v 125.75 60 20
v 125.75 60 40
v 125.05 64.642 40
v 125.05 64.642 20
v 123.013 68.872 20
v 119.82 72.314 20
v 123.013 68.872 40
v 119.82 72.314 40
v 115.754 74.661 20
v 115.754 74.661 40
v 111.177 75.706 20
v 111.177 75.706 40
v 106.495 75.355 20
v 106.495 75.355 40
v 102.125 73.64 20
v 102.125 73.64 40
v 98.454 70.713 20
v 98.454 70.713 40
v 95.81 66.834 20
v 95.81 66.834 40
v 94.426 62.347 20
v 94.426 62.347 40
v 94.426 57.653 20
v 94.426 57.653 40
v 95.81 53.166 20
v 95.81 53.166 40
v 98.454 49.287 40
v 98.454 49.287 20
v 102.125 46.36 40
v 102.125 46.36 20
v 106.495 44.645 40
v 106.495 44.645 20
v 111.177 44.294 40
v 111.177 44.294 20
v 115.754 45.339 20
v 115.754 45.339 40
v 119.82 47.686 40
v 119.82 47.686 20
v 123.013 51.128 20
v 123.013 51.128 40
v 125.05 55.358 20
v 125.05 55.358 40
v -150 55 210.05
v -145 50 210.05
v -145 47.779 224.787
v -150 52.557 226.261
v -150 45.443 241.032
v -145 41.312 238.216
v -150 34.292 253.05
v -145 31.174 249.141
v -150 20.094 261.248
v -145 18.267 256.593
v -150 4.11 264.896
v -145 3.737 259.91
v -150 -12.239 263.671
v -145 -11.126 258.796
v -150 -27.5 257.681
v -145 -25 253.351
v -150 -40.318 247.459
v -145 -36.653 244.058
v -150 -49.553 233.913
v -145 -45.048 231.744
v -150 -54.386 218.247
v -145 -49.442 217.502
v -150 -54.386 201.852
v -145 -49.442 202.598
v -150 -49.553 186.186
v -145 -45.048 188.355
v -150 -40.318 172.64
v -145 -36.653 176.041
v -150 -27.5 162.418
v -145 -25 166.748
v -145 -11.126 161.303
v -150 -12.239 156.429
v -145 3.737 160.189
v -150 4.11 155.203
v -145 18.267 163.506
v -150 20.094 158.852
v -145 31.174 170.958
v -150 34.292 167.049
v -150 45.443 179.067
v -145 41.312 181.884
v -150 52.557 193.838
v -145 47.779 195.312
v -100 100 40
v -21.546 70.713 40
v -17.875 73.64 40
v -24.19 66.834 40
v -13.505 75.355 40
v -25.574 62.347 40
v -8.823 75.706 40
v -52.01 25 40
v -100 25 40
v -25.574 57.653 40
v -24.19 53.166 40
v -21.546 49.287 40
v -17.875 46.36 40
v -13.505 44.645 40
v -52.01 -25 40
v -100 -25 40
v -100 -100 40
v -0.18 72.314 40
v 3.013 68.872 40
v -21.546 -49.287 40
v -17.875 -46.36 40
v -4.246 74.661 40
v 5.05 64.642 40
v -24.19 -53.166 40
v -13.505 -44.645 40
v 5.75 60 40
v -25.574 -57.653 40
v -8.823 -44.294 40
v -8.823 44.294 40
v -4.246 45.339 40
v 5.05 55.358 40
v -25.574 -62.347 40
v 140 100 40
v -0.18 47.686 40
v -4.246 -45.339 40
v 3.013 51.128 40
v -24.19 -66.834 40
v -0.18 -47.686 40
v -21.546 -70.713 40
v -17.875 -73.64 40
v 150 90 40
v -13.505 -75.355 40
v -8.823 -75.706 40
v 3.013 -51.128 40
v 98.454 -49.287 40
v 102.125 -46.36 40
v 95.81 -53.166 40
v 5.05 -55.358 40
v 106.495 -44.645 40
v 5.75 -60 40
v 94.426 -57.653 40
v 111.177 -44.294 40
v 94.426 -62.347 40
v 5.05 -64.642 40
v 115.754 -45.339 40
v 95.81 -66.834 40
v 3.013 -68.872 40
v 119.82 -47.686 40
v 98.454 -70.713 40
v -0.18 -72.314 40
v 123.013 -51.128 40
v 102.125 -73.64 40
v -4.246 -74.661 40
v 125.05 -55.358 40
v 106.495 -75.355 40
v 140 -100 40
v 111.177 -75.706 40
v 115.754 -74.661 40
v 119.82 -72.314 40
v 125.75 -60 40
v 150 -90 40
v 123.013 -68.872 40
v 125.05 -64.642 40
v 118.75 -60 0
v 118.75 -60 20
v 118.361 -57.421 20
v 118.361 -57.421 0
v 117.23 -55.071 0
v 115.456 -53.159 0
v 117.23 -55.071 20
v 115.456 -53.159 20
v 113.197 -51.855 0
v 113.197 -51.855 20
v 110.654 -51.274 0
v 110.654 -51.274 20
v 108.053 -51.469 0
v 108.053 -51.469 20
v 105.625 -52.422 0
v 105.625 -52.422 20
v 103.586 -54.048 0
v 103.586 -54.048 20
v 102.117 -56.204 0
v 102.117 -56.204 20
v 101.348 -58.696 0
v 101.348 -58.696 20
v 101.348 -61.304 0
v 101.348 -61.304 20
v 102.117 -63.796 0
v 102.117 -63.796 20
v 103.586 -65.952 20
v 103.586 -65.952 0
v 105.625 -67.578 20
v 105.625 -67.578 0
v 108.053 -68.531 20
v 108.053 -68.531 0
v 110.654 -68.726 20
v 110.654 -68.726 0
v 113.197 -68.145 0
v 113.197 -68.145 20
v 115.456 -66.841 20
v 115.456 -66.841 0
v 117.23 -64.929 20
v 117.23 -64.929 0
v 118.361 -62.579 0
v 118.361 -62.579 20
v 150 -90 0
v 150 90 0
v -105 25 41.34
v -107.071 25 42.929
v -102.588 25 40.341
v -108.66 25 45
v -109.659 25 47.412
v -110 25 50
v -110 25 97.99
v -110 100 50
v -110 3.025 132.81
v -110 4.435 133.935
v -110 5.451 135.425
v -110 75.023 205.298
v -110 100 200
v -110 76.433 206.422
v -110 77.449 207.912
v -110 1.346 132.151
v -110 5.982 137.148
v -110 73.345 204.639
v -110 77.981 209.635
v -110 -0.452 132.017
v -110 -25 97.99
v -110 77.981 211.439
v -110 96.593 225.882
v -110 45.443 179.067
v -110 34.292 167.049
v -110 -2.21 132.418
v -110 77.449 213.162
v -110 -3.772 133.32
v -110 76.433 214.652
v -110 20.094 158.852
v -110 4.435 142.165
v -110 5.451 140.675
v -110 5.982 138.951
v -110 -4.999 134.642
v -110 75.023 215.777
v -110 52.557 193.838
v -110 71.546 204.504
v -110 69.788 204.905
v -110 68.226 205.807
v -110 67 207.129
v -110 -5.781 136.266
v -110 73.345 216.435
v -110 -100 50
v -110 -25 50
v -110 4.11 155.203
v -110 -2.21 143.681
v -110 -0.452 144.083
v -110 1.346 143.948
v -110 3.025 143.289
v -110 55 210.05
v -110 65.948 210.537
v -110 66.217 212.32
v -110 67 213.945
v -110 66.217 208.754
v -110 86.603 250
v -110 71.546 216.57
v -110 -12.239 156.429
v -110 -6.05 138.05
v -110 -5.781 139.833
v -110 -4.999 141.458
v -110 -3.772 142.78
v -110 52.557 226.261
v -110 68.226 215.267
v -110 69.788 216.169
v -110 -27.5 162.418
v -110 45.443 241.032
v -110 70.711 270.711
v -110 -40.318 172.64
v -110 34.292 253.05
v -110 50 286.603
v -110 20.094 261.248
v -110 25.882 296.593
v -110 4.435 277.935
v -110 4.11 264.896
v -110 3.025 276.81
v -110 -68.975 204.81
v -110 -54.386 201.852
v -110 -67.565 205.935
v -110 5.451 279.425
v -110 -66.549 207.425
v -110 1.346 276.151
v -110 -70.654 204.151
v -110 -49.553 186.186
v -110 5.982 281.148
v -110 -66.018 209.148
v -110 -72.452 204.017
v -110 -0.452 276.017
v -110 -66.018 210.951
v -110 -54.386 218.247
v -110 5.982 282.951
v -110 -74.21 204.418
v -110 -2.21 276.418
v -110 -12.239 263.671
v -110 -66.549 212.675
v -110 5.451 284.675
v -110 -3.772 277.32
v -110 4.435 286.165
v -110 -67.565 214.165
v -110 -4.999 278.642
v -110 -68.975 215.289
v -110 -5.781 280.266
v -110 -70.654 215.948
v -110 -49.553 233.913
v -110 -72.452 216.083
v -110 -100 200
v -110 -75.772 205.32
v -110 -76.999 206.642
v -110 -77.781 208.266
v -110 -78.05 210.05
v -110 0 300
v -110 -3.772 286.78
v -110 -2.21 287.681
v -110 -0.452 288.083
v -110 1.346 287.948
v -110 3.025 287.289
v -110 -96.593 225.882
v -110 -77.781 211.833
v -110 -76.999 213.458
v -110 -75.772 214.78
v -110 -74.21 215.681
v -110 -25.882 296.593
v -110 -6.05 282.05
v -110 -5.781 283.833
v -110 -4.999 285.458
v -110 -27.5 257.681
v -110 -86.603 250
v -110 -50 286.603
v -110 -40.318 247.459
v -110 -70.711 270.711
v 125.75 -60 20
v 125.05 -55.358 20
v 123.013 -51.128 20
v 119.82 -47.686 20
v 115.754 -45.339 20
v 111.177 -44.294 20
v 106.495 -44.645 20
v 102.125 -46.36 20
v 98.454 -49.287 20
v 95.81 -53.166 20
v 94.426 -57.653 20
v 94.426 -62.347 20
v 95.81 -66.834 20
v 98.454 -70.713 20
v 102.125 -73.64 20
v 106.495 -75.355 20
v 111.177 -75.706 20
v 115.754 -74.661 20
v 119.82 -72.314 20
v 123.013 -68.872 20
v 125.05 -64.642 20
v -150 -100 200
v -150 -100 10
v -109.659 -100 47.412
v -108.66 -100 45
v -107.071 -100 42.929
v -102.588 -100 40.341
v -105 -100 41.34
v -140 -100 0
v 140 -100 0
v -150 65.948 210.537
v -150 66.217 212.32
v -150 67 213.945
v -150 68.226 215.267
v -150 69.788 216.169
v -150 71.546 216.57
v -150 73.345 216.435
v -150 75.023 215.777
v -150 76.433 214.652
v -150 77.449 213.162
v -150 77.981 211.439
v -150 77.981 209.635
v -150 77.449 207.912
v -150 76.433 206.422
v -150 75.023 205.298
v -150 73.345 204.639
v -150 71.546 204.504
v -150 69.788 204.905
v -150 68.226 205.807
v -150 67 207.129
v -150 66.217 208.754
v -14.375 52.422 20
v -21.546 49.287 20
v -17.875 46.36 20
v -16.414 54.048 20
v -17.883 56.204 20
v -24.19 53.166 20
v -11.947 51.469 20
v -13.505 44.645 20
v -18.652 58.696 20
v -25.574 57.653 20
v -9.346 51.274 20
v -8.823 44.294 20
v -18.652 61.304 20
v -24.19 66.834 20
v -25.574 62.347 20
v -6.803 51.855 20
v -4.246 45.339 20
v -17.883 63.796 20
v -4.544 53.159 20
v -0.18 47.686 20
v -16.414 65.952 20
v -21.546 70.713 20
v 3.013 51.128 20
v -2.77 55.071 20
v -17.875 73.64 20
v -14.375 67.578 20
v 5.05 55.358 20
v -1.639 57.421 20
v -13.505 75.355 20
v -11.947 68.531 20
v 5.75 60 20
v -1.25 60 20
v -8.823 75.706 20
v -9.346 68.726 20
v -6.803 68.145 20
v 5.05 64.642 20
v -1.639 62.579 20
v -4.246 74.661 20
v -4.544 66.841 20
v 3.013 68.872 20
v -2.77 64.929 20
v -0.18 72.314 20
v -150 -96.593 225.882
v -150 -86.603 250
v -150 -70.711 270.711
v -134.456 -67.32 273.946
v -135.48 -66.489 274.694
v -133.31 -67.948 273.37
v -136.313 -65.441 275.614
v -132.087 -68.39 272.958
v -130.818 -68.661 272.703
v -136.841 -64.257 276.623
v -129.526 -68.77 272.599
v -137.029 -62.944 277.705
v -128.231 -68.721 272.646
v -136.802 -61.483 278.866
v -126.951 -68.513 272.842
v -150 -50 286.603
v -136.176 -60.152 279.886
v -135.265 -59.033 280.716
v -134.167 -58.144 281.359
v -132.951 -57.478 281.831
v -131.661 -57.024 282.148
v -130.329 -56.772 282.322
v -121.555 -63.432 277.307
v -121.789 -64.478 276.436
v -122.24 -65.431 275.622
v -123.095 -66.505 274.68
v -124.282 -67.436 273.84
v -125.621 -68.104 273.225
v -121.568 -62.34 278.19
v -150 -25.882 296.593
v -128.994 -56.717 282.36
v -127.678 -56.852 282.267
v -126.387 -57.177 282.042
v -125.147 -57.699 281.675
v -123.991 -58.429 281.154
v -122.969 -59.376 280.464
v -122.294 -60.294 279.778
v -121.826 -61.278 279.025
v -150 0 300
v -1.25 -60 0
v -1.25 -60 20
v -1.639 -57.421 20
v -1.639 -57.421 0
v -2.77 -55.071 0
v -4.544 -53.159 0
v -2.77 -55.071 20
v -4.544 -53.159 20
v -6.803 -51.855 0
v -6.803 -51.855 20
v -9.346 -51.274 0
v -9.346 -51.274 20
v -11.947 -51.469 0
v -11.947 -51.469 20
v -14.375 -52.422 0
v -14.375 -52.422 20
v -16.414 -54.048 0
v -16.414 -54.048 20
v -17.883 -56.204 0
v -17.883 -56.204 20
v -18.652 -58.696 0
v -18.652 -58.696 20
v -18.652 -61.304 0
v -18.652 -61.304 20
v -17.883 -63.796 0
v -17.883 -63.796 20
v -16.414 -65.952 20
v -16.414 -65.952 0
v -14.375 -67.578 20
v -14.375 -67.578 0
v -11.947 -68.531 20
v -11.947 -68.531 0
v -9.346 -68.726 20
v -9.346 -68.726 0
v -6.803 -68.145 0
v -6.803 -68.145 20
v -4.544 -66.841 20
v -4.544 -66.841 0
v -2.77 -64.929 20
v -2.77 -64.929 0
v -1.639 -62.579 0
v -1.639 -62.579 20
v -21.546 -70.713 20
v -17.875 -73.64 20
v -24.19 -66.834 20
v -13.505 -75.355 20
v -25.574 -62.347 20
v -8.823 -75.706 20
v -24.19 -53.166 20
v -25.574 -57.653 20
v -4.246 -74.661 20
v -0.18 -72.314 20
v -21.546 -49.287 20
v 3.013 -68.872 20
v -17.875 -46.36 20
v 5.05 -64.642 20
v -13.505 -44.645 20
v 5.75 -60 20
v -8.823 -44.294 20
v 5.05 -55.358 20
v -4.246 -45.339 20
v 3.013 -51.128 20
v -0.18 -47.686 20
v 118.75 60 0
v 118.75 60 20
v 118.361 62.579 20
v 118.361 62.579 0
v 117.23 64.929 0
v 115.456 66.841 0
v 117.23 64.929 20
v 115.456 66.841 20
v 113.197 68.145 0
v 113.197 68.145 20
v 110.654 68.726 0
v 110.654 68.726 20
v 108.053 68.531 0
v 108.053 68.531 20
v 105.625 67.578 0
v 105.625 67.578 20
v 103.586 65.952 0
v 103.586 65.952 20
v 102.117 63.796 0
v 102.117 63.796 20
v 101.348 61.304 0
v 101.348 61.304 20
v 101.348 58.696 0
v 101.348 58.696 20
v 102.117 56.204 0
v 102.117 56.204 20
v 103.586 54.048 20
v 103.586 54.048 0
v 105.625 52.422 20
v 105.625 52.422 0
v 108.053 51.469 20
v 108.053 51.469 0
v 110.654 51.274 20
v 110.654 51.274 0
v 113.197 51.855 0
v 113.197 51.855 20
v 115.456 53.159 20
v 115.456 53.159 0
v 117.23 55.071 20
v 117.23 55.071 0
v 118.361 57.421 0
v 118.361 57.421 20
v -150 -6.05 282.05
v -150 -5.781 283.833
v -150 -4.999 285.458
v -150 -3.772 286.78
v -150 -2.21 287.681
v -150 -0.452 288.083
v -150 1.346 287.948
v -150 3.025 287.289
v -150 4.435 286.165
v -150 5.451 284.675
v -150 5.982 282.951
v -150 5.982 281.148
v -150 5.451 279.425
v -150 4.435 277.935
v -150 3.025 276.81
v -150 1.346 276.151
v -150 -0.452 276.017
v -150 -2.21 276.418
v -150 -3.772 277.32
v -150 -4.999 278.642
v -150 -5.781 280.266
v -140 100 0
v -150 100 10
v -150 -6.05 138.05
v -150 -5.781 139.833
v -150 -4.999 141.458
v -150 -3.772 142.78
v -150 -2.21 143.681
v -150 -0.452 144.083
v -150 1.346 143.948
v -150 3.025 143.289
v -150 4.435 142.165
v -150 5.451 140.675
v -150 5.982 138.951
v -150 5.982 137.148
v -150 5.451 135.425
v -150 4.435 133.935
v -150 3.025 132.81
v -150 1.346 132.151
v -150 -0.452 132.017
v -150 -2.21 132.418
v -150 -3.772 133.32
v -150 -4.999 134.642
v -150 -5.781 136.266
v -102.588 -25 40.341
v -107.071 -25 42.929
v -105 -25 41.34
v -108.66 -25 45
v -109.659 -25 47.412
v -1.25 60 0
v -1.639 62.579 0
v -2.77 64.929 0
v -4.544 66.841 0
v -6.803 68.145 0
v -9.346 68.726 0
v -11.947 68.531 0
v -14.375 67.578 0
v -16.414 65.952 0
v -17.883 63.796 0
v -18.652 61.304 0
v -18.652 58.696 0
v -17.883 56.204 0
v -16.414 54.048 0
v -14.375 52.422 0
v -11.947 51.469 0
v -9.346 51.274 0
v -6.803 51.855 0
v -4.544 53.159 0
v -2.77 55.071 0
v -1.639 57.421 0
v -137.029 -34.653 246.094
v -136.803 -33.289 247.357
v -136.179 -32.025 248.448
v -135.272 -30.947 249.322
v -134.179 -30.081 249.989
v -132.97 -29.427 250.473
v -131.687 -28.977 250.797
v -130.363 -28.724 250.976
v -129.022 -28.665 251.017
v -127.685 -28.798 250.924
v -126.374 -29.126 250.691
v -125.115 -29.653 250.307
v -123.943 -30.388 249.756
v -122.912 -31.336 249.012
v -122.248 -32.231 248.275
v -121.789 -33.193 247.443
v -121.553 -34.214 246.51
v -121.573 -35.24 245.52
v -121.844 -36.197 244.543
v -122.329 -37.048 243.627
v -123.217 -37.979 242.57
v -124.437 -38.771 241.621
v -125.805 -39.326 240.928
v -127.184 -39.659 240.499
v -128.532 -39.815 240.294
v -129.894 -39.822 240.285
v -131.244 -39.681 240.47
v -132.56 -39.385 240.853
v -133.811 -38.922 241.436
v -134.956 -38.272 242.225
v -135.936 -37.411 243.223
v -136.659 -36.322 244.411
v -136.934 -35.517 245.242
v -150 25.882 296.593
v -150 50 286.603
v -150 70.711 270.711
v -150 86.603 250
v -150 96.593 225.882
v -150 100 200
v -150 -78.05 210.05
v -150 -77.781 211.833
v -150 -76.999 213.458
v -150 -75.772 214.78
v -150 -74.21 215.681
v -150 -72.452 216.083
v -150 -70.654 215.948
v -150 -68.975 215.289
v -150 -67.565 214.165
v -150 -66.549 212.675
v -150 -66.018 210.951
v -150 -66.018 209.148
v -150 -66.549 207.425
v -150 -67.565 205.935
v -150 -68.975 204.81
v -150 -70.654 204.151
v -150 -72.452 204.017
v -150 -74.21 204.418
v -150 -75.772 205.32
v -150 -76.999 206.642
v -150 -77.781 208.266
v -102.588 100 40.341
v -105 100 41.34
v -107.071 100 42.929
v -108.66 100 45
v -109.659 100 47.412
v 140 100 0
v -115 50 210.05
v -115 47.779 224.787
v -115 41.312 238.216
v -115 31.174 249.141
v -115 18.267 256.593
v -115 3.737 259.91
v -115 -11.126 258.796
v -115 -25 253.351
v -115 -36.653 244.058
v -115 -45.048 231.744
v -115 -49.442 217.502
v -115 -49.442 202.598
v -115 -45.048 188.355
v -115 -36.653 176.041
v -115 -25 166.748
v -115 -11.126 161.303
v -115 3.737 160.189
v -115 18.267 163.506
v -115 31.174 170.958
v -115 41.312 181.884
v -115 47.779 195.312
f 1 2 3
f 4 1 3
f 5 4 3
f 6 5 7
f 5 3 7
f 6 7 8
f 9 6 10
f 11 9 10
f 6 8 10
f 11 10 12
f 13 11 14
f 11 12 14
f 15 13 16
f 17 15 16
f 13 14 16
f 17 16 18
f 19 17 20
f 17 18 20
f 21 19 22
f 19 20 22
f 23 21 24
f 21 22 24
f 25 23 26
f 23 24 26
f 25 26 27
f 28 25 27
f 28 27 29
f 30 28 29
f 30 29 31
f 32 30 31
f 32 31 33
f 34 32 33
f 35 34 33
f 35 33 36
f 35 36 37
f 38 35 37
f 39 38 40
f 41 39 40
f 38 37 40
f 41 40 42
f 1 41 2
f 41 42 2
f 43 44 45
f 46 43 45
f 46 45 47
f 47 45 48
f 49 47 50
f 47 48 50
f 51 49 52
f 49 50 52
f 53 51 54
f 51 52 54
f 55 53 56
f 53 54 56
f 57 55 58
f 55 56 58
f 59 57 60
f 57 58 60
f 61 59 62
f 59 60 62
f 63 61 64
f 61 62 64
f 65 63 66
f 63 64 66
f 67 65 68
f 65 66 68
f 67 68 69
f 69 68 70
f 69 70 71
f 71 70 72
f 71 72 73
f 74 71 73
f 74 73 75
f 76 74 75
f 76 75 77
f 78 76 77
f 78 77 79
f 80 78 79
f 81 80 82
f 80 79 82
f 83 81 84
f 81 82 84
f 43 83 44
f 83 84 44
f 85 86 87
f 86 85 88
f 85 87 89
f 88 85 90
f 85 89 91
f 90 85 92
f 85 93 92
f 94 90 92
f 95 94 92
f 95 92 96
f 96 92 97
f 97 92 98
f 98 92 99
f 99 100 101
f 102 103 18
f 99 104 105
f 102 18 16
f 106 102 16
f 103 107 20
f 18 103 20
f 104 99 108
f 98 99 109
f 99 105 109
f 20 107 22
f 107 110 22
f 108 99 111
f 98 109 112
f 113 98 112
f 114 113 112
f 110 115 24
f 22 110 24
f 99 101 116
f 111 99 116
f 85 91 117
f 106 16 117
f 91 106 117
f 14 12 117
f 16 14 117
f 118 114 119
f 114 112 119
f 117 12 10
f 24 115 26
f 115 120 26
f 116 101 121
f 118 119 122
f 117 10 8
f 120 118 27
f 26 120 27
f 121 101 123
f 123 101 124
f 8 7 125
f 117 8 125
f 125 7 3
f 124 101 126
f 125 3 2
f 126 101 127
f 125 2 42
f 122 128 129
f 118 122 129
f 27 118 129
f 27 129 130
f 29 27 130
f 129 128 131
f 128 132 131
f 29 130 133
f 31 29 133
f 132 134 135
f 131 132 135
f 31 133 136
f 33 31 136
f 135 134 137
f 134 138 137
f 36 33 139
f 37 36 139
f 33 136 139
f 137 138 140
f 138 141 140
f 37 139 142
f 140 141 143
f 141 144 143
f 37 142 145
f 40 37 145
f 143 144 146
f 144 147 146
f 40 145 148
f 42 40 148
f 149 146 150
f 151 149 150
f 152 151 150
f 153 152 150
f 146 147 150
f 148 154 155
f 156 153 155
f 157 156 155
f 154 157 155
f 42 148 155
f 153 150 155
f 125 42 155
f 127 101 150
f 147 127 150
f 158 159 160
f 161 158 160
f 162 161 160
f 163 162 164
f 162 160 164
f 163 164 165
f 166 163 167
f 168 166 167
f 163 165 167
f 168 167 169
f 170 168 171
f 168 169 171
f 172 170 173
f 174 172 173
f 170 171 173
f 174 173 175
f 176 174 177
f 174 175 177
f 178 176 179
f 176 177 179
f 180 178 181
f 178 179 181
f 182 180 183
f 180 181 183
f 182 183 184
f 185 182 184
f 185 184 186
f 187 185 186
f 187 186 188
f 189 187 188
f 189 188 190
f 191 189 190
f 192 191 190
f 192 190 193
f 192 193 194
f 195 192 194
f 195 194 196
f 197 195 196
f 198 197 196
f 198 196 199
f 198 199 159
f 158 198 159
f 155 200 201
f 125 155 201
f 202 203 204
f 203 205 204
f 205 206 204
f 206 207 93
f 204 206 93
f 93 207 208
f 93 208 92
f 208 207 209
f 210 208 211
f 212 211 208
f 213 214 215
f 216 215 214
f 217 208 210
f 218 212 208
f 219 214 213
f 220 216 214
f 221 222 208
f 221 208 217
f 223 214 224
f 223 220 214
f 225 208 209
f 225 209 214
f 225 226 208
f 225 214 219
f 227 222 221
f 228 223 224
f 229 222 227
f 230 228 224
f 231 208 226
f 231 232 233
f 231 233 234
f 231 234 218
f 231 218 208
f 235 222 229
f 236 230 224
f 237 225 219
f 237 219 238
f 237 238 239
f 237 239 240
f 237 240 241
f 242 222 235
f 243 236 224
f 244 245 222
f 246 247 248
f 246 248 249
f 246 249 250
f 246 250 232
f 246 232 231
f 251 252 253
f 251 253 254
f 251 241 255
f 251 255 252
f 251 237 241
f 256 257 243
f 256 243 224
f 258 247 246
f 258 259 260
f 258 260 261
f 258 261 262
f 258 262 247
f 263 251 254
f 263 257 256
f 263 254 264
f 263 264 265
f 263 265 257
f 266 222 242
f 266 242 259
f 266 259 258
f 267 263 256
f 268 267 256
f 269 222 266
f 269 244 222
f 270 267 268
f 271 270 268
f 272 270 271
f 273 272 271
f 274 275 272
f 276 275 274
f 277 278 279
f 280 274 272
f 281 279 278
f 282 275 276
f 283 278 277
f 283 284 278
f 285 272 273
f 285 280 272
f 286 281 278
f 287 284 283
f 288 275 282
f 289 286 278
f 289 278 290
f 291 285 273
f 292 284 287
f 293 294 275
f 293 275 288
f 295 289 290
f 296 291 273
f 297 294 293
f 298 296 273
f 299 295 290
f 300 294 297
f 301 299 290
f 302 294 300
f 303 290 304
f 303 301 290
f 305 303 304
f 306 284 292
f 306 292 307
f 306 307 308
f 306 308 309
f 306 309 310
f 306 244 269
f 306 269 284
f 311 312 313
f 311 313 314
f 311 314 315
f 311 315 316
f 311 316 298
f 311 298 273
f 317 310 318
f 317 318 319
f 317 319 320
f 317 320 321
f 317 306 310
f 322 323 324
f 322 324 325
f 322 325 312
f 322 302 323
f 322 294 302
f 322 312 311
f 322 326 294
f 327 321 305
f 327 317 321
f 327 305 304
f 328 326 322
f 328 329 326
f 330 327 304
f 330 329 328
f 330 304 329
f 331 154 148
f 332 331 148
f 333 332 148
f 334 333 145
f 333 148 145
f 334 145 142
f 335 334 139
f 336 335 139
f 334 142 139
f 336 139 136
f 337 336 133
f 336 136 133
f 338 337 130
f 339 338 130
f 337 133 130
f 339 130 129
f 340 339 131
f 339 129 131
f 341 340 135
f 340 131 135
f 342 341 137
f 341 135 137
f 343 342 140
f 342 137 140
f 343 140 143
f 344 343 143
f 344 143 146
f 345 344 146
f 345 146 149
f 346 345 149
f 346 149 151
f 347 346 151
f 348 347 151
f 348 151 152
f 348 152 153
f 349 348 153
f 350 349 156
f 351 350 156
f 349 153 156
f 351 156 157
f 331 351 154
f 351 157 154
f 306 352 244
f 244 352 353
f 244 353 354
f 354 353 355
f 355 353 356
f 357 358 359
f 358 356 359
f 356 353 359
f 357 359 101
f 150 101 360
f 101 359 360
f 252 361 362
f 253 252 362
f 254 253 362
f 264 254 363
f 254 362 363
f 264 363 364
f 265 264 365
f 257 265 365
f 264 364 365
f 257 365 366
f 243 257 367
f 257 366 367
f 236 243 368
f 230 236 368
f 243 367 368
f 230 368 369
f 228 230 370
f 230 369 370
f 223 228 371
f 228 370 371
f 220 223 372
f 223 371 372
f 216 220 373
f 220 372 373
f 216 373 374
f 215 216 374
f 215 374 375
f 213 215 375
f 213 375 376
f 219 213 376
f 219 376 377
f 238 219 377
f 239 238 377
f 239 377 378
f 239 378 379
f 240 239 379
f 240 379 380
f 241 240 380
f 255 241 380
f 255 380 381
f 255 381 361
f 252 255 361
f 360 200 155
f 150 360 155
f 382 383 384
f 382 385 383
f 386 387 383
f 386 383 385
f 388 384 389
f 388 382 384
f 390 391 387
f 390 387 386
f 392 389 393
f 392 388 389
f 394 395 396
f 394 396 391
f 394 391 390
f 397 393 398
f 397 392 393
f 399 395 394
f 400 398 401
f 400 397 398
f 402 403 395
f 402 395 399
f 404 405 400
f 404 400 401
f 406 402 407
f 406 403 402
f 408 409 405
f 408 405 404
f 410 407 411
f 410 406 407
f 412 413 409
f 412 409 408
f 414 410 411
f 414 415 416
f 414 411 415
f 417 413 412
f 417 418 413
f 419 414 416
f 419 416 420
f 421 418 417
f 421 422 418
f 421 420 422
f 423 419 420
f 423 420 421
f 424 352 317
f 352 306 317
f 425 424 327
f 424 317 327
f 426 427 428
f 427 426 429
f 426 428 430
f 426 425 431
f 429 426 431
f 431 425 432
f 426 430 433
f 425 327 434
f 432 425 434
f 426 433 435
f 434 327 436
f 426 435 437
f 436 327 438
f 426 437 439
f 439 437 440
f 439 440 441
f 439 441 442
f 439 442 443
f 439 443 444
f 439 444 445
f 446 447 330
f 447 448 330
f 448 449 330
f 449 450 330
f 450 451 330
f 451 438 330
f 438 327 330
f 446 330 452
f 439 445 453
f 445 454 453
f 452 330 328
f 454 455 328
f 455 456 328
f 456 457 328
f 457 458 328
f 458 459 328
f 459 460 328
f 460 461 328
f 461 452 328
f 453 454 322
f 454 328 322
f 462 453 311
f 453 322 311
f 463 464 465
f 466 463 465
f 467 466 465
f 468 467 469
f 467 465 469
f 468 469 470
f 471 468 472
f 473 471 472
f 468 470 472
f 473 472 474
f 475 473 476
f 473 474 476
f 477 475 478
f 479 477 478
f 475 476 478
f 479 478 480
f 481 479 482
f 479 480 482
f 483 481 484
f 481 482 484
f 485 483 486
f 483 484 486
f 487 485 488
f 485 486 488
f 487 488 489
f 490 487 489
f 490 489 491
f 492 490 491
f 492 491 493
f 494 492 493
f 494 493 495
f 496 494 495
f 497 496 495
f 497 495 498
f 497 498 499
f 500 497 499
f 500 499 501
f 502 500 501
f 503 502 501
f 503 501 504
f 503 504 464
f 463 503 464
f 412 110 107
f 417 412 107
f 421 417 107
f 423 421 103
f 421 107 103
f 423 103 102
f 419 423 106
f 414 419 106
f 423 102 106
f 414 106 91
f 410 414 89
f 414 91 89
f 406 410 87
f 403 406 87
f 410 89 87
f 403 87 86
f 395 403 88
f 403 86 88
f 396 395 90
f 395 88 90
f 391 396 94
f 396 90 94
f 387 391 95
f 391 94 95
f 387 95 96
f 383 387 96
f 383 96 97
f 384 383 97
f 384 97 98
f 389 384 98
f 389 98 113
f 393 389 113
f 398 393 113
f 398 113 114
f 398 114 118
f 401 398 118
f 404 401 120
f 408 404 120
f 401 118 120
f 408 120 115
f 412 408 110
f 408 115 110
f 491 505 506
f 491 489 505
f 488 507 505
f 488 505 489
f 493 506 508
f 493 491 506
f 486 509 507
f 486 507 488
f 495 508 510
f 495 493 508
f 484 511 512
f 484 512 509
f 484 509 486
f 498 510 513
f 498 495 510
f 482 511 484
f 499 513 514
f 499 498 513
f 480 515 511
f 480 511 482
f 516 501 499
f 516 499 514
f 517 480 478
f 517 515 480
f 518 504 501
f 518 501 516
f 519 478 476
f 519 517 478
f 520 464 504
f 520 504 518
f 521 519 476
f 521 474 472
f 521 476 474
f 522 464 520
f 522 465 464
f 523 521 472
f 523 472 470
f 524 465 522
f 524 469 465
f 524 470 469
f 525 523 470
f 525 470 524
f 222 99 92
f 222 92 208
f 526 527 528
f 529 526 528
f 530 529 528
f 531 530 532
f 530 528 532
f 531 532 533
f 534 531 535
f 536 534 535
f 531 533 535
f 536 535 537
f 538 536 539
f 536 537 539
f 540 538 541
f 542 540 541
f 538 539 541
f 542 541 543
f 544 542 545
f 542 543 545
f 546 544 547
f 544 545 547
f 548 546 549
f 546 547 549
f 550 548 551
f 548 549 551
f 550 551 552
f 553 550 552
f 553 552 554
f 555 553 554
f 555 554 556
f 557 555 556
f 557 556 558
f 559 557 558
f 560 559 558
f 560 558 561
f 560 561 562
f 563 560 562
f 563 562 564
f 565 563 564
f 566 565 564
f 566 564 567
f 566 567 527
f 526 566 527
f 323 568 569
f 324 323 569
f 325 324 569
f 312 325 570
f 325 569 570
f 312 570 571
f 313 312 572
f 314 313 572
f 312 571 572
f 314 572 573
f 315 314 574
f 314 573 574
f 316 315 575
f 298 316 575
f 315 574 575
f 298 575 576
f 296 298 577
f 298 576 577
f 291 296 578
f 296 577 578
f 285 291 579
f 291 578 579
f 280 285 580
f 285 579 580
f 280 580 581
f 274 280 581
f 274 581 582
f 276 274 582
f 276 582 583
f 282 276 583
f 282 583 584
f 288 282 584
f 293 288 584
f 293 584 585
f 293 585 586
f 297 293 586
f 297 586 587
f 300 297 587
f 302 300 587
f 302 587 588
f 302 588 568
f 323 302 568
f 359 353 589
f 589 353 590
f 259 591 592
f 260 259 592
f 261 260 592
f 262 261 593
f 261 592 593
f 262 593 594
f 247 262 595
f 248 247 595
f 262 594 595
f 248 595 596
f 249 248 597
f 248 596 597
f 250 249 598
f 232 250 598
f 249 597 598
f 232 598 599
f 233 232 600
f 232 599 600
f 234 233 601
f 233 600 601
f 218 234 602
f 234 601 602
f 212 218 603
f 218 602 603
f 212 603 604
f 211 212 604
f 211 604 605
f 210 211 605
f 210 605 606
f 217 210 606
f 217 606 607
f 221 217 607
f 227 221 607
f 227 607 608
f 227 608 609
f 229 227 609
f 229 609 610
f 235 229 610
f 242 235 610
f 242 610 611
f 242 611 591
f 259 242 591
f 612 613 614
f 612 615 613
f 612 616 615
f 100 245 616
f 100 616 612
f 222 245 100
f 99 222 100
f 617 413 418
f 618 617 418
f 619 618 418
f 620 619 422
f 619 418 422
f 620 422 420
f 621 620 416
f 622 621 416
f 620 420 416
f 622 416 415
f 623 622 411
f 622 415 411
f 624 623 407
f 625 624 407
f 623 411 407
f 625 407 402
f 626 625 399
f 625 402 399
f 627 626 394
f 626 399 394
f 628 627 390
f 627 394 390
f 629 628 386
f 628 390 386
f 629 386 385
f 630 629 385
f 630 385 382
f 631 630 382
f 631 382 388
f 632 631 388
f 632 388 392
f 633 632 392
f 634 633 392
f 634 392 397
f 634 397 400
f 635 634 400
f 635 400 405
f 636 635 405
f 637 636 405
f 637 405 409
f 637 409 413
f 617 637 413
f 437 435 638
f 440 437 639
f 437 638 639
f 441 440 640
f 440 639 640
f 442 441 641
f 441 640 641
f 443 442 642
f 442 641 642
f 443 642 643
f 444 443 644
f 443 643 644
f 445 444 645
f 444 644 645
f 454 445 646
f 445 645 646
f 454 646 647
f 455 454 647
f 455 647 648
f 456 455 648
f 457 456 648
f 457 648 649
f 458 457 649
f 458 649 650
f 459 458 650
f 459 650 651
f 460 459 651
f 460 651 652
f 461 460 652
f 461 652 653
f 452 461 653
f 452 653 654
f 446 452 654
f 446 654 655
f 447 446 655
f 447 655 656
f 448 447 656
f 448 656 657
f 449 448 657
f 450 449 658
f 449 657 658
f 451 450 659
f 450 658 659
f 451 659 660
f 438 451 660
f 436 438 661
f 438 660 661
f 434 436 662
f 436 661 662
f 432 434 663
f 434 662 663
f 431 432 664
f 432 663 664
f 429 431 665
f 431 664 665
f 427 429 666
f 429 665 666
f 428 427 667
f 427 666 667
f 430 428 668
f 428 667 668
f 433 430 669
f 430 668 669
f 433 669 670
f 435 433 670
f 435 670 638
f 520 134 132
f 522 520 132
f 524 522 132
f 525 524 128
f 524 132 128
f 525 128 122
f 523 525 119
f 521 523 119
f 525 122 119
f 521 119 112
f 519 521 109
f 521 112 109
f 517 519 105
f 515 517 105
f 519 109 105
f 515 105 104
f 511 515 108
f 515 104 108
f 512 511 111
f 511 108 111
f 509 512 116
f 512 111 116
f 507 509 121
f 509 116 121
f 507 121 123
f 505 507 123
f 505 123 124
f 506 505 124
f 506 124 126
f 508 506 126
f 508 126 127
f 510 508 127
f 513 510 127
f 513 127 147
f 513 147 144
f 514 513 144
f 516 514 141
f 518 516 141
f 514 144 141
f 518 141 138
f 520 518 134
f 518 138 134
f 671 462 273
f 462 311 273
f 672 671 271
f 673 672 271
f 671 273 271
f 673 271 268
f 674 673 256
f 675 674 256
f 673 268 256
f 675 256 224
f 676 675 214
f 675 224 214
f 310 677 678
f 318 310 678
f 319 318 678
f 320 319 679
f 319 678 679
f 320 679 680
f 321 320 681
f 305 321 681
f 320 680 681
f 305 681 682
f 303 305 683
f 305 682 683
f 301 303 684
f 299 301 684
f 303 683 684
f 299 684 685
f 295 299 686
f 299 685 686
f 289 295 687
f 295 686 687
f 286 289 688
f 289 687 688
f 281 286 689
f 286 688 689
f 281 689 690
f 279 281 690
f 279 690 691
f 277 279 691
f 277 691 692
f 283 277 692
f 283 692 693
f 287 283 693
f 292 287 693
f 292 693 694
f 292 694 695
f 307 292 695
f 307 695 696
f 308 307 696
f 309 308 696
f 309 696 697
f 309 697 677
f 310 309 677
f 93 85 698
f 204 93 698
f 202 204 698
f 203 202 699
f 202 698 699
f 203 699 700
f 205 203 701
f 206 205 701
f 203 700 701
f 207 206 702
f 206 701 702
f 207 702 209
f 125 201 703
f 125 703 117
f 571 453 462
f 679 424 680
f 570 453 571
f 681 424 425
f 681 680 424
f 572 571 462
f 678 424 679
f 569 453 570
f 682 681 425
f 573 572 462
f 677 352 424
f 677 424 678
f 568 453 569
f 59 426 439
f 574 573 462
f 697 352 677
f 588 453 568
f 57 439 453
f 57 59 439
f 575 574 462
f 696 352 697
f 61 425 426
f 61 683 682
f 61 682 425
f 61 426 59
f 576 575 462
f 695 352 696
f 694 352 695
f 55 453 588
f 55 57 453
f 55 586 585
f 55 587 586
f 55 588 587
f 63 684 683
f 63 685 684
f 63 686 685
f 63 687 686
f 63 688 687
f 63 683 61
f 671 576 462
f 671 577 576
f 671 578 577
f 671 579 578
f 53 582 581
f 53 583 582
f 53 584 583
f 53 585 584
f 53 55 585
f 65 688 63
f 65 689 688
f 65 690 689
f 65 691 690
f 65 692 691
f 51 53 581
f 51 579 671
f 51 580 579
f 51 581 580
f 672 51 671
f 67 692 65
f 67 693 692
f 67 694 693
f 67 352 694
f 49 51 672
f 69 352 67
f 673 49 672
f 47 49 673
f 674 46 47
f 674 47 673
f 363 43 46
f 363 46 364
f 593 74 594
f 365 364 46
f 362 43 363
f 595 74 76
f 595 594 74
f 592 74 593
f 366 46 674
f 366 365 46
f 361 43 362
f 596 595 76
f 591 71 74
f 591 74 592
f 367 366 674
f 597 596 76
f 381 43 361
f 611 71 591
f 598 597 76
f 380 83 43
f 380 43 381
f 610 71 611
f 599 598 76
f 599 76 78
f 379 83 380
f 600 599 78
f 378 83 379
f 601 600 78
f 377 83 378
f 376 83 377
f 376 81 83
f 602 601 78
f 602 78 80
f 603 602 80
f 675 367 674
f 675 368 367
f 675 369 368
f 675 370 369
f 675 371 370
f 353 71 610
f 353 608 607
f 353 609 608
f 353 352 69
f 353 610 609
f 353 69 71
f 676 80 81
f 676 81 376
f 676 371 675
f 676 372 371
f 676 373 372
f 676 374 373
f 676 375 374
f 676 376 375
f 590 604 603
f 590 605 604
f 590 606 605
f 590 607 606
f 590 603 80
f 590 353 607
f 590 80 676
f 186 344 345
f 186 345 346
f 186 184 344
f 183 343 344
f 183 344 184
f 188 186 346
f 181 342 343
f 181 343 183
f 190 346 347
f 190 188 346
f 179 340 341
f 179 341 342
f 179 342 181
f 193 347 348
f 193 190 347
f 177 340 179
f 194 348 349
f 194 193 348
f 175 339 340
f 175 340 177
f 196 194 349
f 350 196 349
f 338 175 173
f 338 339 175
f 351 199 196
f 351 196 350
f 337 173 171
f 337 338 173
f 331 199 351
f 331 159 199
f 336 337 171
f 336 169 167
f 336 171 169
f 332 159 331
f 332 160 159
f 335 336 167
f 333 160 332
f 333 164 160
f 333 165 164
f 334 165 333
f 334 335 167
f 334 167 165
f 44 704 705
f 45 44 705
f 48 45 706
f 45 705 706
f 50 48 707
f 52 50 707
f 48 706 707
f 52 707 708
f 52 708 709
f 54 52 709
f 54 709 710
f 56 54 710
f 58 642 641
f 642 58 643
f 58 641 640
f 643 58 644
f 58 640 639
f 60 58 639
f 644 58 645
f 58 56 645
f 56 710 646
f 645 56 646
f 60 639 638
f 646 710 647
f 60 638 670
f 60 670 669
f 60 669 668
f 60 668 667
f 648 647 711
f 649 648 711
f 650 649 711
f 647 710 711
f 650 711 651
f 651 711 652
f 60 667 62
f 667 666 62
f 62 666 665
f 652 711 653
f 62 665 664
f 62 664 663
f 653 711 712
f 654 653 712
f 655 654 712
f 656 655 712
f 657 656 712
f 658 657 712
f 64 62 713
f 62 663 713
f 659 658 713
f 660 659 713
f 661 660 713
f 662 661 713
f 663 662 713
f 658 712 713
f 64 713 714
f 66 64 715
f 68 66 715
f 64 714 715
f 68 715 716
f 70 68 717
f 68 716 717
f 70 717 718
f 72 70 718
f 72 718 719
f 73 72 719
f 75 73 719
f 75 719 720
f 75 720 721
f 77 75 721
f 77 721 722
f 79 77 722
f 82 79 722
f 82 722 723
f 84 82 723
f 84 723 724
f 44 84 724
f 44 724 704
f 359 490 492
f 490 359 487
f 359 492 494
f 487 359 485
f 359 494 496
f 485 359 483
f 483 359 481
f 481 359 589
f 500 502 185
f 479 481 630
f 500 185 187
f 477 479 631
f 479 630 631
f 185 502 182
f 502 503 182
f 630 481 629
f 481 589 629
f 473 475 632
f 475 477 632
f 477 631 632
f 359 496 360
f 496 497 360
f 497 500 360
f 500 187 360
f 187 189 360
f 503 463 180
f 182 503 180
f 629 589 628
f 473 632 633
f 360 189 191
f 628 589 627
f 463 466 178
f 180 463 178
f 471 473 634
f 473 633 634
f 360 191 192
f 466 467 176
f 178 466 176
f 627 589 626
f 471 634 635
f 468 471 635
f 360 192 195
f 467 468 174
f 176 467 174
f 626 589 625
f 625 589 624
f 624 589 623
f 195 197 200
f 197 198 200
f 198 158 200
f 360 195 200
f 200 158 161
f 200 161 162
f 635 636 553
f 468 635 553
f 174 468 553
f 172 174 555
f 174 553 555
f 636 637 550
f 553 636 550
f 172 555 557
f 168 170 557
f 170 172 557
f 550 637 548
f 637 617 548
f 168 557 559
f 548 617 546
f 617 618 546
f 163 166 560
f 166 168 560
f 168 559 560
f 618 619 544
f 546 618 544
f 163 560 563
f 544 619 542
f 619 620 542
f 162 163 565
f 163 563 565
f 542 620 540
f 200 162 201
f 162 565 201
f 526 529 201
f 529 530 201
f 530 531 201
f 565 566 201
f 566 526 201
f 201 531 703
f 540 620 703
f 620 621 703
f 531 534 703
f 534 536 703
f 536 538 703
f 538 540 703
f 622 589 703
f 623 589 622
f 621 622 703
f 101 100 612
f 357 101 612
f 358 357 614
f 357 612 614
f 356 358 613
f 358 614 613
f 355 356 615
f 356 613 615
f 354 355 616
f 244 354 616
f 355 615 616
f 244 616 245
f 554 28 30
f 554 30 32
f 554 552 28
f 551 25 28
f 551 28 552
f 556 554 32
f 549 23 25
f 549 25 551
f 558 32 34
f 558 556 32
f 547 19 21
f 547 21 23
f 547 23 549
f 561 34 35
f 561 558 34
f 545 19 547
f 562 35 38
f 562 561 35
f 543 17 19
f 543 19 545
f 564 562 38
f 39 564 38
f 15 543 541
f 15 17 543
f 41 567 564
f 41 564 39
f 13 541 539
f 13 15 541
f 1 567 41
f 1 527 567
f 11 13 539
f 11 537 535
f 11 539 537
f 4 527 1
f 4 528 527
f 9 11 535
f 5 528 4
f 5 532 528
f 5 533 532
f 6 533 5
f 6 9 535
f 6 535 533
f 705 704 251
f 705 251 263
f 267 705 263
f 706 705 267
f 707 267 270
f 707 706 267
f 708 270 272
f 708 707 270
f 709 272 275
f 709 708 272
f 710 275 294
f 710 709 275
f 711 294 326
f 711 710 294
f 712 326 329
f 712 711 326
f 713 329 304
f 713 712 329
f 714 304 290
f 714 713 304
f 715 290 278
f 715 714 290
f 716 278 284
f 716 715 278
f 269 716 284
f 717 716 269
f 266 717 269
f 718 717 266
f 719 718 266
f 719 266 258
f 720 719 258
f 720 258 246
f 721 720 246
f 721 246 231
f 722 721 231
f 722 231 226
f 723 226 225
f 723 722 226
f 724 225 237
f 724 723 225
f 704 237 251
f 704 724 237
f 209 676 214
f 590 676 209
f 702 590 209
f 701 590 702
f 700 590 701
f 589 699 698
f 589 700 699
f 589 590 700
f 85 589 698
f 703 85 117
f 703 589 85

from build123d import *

# Parameters (mm, degrees)
F0_W      = 300
F0_H      = 200
F1_DEPTH  = 300
F2_W      = 260
F2_H      = 260
F3_DEPTH  = 421.64
F4_SIZE   = 10
F5_R      = 10
F6_SIZE   = 10
F7_R      = 8.75
F8_DEPTH  = 79.502
F7_R_2    = 15.75
F9_DEPTH  = 20
F10_R     = 99.99999
F11_R     = 50
F12_DEPTH = 145.034
F13_D     = 12.1
F14_SIZE  = 5
F16_DEPTH = 25
F20_D     = 15.5
F20_DEPTH = 44.0944
F20_START = 0.8055971
F20_TIP   = 4.6566697975


# Not quite as in the source:
# - a fillet or chamfer is up to 0.001 mm smaller than in the source, because OpenCascade refuses the exact size


with BuildPart() as f1:
    # F0 (on Top) → F1 (new body)
    with BuildSketch(Plane.XY):
        Rectangle(F0_W, F0_H)
    extrude(amount=F1_DEPTH)

    # F2 (on face) → F3 (cut)
    with BuildSketch(Plane.XZ.offset(100)):
        with Locations((20, 170)):
            Rectangle(F2_W, F2_H)
    extrude(amount=-F3_DEPTH, mode=Mode.SUBTRACT)

    # F4
    f4_edges = [f1.edges().sort_by_distance(p)[0] for p in [
        (150, -100, 20),
        (150, 100, 20),
    ]]
    chamfer(f4_edges, length=F4_SIZE)

    # F5
    f5_edges = [f1.edges().sort_by_distance(p)[0] for p in [
        (-110, 0, 40),
    ]]
    fillet(f5_edges, radius=F5_R)

    # F6
    f6_edges = [f1.edges().sort_by_distance(p)[0] for p in [
        (-150, 0, 0),
    ]]
    chamfer(f6_edges, length=F6_SIZE)

    # F7 (on face) → F8 (cut)
    with BuildSketch(Plane.XY.offset(40)):
        with Locations((110, -60)):
            Circle(F7_R)
        with Locations((110, 60)):
            Circle(F7_R)
        with Locations((-10, 60)):
            Circle(F7_R)
        with Locations((-10, -60)):
            Circle(F7_R)
    extrude(amount=-F8_DEPTH, mode=Mode.SUBTRACT)

    # F7 (on face) → F9 (cut)
    with BuildSketch(Plane.XY.offset(40)):
        with Locations((-10, 60)):
            Circle(F7_R_2)
        with Locations((-10, 60)):
            Circle(F7_R, mode=Mode.SUBTRACT)
        with Locations((-10, -60)):
            Circle(F7_R_2)
        with Locations((-10, -60)):
            Circle(F7_R, mode=Mode.SUBTRACT)
        with Locations((110, -60)):
            Circle(F7_R_2)
        with Locations((110, -60)):
            Circle(F7_R, mode=Mode.SUBTRACT)
        with Locations((110, 60)):
            Circle(F7_R_2)
        with Locations((110, 60)):
            Circle(F7_R, mode=Mode.SUBTRACT)
    extrude(amount=-F9_DEPTH, mode=Mode.SUBTRACT)

    # F10 (radius 100 in the source; OpenCascade refuses exactly that, so slightly less here)
    f10_edges = [f1.edges().sort_by_distance(p)[0] for p in [
        (-130, -100, 300),
        (-130, 100, 300),
    ]]
    fillet(f10_edges, radius=F10_R)

    # F11 (on face) → F12 (cut)
    with BuildSketch(Plane.YZ.offset(-110)):
        with Locations((0, 210.0496292114)):
            Circle(F11_R)
    extrude(amount=-F12_DEPTH, mode=Mode.SUBTRACT)

    # F13 (through all)
    with Locations(Plane.YZ.offset(-110)):
        with Locations((-72, 210.0496292114), (0, 282.0496292114), (71.9983499009, 210.5370833633), (0, 138.0496292114)):
            Hole(F13_D / 2)

    # F14
    f14_edges = [f1.edges().sort_by_distance(p)[0] for p in [
        (-150, -50, 210.049629),
        (-110, -50, 210.049629),
    ]]
    chamfer(f14_edges, length=F14_SIZE)

    # F15 (on Front) → F16 (join, symmetric)
    with BuildSketch(Plane.XZ):
        Polygon((-51.5841689292, 39.5744924862), (-111.5841689292, 99.5744924862), (-111.5841689292, 39.5744924862), align=None)
    extrude(amount=F16_DEPTH, both=True)

    # F20
    # its depths count from where the whole tool has entered the part; down to there all is cleared
    with Locations(Plane(origin=(0, -166.0770217272, 185.5655664485), x_dir=(1, 0, 0), z_dir=(0, -0.6668944822, 0.7451521654)).offset(-F20_START)):
        with Locations((-129.2792707682, 138.2966190577)):
            Hole(F20_D / 2, depth=F20_DEPTH)
            with Locations((0, 0, -(F20_DEPTH + F20_TIP / 2))):  # 118° drill point
                Cone(0, F20_D / 2, F20_TIP, mode=Mode.SUBTRACT)


solid = f1.part
